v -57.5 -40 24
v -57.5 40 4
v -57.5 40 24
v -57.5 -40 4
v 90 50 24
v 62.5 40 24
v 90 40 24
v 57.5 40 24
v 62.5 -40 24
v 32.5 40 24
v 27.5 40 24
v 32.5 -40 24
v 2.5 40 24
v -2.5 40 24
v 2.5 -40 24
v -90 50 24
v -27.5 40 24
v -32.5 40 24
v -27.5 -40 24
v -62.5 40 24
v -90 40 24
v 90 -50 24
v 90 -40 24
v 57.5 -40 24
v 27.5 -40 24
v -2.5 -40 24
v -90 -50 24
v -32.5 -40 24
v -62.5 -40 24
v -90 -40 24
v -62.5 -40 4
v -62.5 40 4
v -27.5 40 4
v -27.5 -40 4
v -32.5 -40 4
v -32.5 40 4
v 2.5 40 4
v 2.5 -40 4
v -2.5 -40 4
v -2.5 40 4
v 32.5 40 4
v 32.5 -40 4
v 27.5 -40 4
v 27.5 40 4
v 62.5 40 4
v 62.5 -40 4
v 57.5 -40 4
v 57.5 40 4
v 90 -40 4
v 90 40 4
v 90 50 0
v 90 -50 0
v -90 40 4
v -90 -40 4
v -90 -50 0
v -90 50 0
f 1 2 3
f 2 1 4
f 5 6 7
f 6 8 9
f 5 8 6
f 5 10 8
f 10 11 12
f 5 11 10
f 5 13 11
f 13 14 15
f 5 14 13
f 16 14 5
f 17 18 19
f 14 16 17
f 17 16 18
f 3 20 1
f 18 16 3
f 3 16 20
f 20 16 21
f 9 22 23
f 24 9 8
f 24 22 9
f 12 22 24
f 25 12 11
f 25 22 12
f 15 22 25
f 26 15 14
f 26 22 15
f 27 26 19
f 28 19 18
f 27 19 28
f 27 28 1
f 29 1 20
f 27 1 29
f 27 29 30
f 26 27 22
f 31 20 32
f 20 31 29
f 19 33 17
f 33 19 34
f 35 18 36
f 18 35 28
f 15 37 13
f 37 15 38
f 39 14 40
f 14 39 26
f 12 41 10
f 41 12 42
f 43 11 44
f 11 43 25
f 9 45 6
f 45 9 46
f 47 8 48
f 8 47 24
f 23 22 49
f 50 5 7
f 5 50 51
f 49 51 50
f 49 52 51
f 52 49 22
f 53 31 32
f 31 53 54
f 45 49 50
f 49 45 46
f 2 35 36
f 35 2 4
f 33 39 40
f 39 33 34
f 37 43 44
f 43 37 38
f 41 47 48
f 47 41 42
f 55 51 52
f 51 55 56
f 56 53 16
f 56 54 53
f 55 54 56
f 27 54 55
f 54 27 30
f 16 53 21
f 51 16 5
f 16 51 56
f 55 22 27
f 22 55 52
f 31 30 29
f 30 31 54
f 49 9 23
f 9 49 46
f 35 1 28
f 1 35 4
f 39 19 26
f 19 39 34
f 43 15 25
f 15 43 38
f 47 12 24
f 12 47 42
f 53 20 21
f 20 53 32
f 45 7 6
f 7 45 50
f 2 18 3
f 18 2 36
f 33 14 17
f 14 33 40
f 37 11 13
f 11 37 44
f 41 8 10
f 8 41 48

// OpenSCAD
$fn = 32;

// ----------------------------------------------------------------------
// Rib frame 180 x 100 x 24
// 5 ribs at 30 mm pitch
// ----------------------------------------------------------------------

// --- parameters (mm) ---
frame = [180, 100, 4];  // base plate size (x, y, z)
rail_w = 10;            // side rail width
ribs = 5;               // number of ribs
rib_t = 5;              // rib thickness
rib_h = 20;             // rib height above the base plate
pitch = 30;             // pitch between rib centres

// --- derived feature positions (mm) ---
span = (ribs - 1) * pitch;          // = 120   distance between the outer ribs
origin_x = -span / 2;               // = -60   X of the first rib
rib_len = frame[1] - 2 * rail_w + 2;  // = 82   rib length, 1 mm into each rail
feature_centers = [
  [origin_x + 0 * pitch, 0],
  [origin_x + 1 * pitch, 0],
  [origin_x + 2 * pitch, 0],
  [origin_x + 3 * pitch, 0],
  [origin_x + 4 * pitch, 0]
];   // rib centre line, drives the rib loop

// base plate, two side rails, then the ribs read straight off feature_centers
union() {
  translate([-frame[0] / 2, -frame[1] / 2, 0]) cube(frame);
  translate([-frame[0] / 2, -frame[1] / 2, 0]) cube([frame[0], rail_w, frame[2] + rib_h]);
  translate([-frame[0] / 2, frame[1] / 2 - rail_w, 0]) cube([frame[0], rail_w, frame[2] + rib_h]);
  for (centre = feature_centers)
    translate([centre[0] - rib_t / 2, centre[1] - rib_len / 2, frame[2] - 1])
      cube([rib_t, rib_len, rib_h + 1]);
}
